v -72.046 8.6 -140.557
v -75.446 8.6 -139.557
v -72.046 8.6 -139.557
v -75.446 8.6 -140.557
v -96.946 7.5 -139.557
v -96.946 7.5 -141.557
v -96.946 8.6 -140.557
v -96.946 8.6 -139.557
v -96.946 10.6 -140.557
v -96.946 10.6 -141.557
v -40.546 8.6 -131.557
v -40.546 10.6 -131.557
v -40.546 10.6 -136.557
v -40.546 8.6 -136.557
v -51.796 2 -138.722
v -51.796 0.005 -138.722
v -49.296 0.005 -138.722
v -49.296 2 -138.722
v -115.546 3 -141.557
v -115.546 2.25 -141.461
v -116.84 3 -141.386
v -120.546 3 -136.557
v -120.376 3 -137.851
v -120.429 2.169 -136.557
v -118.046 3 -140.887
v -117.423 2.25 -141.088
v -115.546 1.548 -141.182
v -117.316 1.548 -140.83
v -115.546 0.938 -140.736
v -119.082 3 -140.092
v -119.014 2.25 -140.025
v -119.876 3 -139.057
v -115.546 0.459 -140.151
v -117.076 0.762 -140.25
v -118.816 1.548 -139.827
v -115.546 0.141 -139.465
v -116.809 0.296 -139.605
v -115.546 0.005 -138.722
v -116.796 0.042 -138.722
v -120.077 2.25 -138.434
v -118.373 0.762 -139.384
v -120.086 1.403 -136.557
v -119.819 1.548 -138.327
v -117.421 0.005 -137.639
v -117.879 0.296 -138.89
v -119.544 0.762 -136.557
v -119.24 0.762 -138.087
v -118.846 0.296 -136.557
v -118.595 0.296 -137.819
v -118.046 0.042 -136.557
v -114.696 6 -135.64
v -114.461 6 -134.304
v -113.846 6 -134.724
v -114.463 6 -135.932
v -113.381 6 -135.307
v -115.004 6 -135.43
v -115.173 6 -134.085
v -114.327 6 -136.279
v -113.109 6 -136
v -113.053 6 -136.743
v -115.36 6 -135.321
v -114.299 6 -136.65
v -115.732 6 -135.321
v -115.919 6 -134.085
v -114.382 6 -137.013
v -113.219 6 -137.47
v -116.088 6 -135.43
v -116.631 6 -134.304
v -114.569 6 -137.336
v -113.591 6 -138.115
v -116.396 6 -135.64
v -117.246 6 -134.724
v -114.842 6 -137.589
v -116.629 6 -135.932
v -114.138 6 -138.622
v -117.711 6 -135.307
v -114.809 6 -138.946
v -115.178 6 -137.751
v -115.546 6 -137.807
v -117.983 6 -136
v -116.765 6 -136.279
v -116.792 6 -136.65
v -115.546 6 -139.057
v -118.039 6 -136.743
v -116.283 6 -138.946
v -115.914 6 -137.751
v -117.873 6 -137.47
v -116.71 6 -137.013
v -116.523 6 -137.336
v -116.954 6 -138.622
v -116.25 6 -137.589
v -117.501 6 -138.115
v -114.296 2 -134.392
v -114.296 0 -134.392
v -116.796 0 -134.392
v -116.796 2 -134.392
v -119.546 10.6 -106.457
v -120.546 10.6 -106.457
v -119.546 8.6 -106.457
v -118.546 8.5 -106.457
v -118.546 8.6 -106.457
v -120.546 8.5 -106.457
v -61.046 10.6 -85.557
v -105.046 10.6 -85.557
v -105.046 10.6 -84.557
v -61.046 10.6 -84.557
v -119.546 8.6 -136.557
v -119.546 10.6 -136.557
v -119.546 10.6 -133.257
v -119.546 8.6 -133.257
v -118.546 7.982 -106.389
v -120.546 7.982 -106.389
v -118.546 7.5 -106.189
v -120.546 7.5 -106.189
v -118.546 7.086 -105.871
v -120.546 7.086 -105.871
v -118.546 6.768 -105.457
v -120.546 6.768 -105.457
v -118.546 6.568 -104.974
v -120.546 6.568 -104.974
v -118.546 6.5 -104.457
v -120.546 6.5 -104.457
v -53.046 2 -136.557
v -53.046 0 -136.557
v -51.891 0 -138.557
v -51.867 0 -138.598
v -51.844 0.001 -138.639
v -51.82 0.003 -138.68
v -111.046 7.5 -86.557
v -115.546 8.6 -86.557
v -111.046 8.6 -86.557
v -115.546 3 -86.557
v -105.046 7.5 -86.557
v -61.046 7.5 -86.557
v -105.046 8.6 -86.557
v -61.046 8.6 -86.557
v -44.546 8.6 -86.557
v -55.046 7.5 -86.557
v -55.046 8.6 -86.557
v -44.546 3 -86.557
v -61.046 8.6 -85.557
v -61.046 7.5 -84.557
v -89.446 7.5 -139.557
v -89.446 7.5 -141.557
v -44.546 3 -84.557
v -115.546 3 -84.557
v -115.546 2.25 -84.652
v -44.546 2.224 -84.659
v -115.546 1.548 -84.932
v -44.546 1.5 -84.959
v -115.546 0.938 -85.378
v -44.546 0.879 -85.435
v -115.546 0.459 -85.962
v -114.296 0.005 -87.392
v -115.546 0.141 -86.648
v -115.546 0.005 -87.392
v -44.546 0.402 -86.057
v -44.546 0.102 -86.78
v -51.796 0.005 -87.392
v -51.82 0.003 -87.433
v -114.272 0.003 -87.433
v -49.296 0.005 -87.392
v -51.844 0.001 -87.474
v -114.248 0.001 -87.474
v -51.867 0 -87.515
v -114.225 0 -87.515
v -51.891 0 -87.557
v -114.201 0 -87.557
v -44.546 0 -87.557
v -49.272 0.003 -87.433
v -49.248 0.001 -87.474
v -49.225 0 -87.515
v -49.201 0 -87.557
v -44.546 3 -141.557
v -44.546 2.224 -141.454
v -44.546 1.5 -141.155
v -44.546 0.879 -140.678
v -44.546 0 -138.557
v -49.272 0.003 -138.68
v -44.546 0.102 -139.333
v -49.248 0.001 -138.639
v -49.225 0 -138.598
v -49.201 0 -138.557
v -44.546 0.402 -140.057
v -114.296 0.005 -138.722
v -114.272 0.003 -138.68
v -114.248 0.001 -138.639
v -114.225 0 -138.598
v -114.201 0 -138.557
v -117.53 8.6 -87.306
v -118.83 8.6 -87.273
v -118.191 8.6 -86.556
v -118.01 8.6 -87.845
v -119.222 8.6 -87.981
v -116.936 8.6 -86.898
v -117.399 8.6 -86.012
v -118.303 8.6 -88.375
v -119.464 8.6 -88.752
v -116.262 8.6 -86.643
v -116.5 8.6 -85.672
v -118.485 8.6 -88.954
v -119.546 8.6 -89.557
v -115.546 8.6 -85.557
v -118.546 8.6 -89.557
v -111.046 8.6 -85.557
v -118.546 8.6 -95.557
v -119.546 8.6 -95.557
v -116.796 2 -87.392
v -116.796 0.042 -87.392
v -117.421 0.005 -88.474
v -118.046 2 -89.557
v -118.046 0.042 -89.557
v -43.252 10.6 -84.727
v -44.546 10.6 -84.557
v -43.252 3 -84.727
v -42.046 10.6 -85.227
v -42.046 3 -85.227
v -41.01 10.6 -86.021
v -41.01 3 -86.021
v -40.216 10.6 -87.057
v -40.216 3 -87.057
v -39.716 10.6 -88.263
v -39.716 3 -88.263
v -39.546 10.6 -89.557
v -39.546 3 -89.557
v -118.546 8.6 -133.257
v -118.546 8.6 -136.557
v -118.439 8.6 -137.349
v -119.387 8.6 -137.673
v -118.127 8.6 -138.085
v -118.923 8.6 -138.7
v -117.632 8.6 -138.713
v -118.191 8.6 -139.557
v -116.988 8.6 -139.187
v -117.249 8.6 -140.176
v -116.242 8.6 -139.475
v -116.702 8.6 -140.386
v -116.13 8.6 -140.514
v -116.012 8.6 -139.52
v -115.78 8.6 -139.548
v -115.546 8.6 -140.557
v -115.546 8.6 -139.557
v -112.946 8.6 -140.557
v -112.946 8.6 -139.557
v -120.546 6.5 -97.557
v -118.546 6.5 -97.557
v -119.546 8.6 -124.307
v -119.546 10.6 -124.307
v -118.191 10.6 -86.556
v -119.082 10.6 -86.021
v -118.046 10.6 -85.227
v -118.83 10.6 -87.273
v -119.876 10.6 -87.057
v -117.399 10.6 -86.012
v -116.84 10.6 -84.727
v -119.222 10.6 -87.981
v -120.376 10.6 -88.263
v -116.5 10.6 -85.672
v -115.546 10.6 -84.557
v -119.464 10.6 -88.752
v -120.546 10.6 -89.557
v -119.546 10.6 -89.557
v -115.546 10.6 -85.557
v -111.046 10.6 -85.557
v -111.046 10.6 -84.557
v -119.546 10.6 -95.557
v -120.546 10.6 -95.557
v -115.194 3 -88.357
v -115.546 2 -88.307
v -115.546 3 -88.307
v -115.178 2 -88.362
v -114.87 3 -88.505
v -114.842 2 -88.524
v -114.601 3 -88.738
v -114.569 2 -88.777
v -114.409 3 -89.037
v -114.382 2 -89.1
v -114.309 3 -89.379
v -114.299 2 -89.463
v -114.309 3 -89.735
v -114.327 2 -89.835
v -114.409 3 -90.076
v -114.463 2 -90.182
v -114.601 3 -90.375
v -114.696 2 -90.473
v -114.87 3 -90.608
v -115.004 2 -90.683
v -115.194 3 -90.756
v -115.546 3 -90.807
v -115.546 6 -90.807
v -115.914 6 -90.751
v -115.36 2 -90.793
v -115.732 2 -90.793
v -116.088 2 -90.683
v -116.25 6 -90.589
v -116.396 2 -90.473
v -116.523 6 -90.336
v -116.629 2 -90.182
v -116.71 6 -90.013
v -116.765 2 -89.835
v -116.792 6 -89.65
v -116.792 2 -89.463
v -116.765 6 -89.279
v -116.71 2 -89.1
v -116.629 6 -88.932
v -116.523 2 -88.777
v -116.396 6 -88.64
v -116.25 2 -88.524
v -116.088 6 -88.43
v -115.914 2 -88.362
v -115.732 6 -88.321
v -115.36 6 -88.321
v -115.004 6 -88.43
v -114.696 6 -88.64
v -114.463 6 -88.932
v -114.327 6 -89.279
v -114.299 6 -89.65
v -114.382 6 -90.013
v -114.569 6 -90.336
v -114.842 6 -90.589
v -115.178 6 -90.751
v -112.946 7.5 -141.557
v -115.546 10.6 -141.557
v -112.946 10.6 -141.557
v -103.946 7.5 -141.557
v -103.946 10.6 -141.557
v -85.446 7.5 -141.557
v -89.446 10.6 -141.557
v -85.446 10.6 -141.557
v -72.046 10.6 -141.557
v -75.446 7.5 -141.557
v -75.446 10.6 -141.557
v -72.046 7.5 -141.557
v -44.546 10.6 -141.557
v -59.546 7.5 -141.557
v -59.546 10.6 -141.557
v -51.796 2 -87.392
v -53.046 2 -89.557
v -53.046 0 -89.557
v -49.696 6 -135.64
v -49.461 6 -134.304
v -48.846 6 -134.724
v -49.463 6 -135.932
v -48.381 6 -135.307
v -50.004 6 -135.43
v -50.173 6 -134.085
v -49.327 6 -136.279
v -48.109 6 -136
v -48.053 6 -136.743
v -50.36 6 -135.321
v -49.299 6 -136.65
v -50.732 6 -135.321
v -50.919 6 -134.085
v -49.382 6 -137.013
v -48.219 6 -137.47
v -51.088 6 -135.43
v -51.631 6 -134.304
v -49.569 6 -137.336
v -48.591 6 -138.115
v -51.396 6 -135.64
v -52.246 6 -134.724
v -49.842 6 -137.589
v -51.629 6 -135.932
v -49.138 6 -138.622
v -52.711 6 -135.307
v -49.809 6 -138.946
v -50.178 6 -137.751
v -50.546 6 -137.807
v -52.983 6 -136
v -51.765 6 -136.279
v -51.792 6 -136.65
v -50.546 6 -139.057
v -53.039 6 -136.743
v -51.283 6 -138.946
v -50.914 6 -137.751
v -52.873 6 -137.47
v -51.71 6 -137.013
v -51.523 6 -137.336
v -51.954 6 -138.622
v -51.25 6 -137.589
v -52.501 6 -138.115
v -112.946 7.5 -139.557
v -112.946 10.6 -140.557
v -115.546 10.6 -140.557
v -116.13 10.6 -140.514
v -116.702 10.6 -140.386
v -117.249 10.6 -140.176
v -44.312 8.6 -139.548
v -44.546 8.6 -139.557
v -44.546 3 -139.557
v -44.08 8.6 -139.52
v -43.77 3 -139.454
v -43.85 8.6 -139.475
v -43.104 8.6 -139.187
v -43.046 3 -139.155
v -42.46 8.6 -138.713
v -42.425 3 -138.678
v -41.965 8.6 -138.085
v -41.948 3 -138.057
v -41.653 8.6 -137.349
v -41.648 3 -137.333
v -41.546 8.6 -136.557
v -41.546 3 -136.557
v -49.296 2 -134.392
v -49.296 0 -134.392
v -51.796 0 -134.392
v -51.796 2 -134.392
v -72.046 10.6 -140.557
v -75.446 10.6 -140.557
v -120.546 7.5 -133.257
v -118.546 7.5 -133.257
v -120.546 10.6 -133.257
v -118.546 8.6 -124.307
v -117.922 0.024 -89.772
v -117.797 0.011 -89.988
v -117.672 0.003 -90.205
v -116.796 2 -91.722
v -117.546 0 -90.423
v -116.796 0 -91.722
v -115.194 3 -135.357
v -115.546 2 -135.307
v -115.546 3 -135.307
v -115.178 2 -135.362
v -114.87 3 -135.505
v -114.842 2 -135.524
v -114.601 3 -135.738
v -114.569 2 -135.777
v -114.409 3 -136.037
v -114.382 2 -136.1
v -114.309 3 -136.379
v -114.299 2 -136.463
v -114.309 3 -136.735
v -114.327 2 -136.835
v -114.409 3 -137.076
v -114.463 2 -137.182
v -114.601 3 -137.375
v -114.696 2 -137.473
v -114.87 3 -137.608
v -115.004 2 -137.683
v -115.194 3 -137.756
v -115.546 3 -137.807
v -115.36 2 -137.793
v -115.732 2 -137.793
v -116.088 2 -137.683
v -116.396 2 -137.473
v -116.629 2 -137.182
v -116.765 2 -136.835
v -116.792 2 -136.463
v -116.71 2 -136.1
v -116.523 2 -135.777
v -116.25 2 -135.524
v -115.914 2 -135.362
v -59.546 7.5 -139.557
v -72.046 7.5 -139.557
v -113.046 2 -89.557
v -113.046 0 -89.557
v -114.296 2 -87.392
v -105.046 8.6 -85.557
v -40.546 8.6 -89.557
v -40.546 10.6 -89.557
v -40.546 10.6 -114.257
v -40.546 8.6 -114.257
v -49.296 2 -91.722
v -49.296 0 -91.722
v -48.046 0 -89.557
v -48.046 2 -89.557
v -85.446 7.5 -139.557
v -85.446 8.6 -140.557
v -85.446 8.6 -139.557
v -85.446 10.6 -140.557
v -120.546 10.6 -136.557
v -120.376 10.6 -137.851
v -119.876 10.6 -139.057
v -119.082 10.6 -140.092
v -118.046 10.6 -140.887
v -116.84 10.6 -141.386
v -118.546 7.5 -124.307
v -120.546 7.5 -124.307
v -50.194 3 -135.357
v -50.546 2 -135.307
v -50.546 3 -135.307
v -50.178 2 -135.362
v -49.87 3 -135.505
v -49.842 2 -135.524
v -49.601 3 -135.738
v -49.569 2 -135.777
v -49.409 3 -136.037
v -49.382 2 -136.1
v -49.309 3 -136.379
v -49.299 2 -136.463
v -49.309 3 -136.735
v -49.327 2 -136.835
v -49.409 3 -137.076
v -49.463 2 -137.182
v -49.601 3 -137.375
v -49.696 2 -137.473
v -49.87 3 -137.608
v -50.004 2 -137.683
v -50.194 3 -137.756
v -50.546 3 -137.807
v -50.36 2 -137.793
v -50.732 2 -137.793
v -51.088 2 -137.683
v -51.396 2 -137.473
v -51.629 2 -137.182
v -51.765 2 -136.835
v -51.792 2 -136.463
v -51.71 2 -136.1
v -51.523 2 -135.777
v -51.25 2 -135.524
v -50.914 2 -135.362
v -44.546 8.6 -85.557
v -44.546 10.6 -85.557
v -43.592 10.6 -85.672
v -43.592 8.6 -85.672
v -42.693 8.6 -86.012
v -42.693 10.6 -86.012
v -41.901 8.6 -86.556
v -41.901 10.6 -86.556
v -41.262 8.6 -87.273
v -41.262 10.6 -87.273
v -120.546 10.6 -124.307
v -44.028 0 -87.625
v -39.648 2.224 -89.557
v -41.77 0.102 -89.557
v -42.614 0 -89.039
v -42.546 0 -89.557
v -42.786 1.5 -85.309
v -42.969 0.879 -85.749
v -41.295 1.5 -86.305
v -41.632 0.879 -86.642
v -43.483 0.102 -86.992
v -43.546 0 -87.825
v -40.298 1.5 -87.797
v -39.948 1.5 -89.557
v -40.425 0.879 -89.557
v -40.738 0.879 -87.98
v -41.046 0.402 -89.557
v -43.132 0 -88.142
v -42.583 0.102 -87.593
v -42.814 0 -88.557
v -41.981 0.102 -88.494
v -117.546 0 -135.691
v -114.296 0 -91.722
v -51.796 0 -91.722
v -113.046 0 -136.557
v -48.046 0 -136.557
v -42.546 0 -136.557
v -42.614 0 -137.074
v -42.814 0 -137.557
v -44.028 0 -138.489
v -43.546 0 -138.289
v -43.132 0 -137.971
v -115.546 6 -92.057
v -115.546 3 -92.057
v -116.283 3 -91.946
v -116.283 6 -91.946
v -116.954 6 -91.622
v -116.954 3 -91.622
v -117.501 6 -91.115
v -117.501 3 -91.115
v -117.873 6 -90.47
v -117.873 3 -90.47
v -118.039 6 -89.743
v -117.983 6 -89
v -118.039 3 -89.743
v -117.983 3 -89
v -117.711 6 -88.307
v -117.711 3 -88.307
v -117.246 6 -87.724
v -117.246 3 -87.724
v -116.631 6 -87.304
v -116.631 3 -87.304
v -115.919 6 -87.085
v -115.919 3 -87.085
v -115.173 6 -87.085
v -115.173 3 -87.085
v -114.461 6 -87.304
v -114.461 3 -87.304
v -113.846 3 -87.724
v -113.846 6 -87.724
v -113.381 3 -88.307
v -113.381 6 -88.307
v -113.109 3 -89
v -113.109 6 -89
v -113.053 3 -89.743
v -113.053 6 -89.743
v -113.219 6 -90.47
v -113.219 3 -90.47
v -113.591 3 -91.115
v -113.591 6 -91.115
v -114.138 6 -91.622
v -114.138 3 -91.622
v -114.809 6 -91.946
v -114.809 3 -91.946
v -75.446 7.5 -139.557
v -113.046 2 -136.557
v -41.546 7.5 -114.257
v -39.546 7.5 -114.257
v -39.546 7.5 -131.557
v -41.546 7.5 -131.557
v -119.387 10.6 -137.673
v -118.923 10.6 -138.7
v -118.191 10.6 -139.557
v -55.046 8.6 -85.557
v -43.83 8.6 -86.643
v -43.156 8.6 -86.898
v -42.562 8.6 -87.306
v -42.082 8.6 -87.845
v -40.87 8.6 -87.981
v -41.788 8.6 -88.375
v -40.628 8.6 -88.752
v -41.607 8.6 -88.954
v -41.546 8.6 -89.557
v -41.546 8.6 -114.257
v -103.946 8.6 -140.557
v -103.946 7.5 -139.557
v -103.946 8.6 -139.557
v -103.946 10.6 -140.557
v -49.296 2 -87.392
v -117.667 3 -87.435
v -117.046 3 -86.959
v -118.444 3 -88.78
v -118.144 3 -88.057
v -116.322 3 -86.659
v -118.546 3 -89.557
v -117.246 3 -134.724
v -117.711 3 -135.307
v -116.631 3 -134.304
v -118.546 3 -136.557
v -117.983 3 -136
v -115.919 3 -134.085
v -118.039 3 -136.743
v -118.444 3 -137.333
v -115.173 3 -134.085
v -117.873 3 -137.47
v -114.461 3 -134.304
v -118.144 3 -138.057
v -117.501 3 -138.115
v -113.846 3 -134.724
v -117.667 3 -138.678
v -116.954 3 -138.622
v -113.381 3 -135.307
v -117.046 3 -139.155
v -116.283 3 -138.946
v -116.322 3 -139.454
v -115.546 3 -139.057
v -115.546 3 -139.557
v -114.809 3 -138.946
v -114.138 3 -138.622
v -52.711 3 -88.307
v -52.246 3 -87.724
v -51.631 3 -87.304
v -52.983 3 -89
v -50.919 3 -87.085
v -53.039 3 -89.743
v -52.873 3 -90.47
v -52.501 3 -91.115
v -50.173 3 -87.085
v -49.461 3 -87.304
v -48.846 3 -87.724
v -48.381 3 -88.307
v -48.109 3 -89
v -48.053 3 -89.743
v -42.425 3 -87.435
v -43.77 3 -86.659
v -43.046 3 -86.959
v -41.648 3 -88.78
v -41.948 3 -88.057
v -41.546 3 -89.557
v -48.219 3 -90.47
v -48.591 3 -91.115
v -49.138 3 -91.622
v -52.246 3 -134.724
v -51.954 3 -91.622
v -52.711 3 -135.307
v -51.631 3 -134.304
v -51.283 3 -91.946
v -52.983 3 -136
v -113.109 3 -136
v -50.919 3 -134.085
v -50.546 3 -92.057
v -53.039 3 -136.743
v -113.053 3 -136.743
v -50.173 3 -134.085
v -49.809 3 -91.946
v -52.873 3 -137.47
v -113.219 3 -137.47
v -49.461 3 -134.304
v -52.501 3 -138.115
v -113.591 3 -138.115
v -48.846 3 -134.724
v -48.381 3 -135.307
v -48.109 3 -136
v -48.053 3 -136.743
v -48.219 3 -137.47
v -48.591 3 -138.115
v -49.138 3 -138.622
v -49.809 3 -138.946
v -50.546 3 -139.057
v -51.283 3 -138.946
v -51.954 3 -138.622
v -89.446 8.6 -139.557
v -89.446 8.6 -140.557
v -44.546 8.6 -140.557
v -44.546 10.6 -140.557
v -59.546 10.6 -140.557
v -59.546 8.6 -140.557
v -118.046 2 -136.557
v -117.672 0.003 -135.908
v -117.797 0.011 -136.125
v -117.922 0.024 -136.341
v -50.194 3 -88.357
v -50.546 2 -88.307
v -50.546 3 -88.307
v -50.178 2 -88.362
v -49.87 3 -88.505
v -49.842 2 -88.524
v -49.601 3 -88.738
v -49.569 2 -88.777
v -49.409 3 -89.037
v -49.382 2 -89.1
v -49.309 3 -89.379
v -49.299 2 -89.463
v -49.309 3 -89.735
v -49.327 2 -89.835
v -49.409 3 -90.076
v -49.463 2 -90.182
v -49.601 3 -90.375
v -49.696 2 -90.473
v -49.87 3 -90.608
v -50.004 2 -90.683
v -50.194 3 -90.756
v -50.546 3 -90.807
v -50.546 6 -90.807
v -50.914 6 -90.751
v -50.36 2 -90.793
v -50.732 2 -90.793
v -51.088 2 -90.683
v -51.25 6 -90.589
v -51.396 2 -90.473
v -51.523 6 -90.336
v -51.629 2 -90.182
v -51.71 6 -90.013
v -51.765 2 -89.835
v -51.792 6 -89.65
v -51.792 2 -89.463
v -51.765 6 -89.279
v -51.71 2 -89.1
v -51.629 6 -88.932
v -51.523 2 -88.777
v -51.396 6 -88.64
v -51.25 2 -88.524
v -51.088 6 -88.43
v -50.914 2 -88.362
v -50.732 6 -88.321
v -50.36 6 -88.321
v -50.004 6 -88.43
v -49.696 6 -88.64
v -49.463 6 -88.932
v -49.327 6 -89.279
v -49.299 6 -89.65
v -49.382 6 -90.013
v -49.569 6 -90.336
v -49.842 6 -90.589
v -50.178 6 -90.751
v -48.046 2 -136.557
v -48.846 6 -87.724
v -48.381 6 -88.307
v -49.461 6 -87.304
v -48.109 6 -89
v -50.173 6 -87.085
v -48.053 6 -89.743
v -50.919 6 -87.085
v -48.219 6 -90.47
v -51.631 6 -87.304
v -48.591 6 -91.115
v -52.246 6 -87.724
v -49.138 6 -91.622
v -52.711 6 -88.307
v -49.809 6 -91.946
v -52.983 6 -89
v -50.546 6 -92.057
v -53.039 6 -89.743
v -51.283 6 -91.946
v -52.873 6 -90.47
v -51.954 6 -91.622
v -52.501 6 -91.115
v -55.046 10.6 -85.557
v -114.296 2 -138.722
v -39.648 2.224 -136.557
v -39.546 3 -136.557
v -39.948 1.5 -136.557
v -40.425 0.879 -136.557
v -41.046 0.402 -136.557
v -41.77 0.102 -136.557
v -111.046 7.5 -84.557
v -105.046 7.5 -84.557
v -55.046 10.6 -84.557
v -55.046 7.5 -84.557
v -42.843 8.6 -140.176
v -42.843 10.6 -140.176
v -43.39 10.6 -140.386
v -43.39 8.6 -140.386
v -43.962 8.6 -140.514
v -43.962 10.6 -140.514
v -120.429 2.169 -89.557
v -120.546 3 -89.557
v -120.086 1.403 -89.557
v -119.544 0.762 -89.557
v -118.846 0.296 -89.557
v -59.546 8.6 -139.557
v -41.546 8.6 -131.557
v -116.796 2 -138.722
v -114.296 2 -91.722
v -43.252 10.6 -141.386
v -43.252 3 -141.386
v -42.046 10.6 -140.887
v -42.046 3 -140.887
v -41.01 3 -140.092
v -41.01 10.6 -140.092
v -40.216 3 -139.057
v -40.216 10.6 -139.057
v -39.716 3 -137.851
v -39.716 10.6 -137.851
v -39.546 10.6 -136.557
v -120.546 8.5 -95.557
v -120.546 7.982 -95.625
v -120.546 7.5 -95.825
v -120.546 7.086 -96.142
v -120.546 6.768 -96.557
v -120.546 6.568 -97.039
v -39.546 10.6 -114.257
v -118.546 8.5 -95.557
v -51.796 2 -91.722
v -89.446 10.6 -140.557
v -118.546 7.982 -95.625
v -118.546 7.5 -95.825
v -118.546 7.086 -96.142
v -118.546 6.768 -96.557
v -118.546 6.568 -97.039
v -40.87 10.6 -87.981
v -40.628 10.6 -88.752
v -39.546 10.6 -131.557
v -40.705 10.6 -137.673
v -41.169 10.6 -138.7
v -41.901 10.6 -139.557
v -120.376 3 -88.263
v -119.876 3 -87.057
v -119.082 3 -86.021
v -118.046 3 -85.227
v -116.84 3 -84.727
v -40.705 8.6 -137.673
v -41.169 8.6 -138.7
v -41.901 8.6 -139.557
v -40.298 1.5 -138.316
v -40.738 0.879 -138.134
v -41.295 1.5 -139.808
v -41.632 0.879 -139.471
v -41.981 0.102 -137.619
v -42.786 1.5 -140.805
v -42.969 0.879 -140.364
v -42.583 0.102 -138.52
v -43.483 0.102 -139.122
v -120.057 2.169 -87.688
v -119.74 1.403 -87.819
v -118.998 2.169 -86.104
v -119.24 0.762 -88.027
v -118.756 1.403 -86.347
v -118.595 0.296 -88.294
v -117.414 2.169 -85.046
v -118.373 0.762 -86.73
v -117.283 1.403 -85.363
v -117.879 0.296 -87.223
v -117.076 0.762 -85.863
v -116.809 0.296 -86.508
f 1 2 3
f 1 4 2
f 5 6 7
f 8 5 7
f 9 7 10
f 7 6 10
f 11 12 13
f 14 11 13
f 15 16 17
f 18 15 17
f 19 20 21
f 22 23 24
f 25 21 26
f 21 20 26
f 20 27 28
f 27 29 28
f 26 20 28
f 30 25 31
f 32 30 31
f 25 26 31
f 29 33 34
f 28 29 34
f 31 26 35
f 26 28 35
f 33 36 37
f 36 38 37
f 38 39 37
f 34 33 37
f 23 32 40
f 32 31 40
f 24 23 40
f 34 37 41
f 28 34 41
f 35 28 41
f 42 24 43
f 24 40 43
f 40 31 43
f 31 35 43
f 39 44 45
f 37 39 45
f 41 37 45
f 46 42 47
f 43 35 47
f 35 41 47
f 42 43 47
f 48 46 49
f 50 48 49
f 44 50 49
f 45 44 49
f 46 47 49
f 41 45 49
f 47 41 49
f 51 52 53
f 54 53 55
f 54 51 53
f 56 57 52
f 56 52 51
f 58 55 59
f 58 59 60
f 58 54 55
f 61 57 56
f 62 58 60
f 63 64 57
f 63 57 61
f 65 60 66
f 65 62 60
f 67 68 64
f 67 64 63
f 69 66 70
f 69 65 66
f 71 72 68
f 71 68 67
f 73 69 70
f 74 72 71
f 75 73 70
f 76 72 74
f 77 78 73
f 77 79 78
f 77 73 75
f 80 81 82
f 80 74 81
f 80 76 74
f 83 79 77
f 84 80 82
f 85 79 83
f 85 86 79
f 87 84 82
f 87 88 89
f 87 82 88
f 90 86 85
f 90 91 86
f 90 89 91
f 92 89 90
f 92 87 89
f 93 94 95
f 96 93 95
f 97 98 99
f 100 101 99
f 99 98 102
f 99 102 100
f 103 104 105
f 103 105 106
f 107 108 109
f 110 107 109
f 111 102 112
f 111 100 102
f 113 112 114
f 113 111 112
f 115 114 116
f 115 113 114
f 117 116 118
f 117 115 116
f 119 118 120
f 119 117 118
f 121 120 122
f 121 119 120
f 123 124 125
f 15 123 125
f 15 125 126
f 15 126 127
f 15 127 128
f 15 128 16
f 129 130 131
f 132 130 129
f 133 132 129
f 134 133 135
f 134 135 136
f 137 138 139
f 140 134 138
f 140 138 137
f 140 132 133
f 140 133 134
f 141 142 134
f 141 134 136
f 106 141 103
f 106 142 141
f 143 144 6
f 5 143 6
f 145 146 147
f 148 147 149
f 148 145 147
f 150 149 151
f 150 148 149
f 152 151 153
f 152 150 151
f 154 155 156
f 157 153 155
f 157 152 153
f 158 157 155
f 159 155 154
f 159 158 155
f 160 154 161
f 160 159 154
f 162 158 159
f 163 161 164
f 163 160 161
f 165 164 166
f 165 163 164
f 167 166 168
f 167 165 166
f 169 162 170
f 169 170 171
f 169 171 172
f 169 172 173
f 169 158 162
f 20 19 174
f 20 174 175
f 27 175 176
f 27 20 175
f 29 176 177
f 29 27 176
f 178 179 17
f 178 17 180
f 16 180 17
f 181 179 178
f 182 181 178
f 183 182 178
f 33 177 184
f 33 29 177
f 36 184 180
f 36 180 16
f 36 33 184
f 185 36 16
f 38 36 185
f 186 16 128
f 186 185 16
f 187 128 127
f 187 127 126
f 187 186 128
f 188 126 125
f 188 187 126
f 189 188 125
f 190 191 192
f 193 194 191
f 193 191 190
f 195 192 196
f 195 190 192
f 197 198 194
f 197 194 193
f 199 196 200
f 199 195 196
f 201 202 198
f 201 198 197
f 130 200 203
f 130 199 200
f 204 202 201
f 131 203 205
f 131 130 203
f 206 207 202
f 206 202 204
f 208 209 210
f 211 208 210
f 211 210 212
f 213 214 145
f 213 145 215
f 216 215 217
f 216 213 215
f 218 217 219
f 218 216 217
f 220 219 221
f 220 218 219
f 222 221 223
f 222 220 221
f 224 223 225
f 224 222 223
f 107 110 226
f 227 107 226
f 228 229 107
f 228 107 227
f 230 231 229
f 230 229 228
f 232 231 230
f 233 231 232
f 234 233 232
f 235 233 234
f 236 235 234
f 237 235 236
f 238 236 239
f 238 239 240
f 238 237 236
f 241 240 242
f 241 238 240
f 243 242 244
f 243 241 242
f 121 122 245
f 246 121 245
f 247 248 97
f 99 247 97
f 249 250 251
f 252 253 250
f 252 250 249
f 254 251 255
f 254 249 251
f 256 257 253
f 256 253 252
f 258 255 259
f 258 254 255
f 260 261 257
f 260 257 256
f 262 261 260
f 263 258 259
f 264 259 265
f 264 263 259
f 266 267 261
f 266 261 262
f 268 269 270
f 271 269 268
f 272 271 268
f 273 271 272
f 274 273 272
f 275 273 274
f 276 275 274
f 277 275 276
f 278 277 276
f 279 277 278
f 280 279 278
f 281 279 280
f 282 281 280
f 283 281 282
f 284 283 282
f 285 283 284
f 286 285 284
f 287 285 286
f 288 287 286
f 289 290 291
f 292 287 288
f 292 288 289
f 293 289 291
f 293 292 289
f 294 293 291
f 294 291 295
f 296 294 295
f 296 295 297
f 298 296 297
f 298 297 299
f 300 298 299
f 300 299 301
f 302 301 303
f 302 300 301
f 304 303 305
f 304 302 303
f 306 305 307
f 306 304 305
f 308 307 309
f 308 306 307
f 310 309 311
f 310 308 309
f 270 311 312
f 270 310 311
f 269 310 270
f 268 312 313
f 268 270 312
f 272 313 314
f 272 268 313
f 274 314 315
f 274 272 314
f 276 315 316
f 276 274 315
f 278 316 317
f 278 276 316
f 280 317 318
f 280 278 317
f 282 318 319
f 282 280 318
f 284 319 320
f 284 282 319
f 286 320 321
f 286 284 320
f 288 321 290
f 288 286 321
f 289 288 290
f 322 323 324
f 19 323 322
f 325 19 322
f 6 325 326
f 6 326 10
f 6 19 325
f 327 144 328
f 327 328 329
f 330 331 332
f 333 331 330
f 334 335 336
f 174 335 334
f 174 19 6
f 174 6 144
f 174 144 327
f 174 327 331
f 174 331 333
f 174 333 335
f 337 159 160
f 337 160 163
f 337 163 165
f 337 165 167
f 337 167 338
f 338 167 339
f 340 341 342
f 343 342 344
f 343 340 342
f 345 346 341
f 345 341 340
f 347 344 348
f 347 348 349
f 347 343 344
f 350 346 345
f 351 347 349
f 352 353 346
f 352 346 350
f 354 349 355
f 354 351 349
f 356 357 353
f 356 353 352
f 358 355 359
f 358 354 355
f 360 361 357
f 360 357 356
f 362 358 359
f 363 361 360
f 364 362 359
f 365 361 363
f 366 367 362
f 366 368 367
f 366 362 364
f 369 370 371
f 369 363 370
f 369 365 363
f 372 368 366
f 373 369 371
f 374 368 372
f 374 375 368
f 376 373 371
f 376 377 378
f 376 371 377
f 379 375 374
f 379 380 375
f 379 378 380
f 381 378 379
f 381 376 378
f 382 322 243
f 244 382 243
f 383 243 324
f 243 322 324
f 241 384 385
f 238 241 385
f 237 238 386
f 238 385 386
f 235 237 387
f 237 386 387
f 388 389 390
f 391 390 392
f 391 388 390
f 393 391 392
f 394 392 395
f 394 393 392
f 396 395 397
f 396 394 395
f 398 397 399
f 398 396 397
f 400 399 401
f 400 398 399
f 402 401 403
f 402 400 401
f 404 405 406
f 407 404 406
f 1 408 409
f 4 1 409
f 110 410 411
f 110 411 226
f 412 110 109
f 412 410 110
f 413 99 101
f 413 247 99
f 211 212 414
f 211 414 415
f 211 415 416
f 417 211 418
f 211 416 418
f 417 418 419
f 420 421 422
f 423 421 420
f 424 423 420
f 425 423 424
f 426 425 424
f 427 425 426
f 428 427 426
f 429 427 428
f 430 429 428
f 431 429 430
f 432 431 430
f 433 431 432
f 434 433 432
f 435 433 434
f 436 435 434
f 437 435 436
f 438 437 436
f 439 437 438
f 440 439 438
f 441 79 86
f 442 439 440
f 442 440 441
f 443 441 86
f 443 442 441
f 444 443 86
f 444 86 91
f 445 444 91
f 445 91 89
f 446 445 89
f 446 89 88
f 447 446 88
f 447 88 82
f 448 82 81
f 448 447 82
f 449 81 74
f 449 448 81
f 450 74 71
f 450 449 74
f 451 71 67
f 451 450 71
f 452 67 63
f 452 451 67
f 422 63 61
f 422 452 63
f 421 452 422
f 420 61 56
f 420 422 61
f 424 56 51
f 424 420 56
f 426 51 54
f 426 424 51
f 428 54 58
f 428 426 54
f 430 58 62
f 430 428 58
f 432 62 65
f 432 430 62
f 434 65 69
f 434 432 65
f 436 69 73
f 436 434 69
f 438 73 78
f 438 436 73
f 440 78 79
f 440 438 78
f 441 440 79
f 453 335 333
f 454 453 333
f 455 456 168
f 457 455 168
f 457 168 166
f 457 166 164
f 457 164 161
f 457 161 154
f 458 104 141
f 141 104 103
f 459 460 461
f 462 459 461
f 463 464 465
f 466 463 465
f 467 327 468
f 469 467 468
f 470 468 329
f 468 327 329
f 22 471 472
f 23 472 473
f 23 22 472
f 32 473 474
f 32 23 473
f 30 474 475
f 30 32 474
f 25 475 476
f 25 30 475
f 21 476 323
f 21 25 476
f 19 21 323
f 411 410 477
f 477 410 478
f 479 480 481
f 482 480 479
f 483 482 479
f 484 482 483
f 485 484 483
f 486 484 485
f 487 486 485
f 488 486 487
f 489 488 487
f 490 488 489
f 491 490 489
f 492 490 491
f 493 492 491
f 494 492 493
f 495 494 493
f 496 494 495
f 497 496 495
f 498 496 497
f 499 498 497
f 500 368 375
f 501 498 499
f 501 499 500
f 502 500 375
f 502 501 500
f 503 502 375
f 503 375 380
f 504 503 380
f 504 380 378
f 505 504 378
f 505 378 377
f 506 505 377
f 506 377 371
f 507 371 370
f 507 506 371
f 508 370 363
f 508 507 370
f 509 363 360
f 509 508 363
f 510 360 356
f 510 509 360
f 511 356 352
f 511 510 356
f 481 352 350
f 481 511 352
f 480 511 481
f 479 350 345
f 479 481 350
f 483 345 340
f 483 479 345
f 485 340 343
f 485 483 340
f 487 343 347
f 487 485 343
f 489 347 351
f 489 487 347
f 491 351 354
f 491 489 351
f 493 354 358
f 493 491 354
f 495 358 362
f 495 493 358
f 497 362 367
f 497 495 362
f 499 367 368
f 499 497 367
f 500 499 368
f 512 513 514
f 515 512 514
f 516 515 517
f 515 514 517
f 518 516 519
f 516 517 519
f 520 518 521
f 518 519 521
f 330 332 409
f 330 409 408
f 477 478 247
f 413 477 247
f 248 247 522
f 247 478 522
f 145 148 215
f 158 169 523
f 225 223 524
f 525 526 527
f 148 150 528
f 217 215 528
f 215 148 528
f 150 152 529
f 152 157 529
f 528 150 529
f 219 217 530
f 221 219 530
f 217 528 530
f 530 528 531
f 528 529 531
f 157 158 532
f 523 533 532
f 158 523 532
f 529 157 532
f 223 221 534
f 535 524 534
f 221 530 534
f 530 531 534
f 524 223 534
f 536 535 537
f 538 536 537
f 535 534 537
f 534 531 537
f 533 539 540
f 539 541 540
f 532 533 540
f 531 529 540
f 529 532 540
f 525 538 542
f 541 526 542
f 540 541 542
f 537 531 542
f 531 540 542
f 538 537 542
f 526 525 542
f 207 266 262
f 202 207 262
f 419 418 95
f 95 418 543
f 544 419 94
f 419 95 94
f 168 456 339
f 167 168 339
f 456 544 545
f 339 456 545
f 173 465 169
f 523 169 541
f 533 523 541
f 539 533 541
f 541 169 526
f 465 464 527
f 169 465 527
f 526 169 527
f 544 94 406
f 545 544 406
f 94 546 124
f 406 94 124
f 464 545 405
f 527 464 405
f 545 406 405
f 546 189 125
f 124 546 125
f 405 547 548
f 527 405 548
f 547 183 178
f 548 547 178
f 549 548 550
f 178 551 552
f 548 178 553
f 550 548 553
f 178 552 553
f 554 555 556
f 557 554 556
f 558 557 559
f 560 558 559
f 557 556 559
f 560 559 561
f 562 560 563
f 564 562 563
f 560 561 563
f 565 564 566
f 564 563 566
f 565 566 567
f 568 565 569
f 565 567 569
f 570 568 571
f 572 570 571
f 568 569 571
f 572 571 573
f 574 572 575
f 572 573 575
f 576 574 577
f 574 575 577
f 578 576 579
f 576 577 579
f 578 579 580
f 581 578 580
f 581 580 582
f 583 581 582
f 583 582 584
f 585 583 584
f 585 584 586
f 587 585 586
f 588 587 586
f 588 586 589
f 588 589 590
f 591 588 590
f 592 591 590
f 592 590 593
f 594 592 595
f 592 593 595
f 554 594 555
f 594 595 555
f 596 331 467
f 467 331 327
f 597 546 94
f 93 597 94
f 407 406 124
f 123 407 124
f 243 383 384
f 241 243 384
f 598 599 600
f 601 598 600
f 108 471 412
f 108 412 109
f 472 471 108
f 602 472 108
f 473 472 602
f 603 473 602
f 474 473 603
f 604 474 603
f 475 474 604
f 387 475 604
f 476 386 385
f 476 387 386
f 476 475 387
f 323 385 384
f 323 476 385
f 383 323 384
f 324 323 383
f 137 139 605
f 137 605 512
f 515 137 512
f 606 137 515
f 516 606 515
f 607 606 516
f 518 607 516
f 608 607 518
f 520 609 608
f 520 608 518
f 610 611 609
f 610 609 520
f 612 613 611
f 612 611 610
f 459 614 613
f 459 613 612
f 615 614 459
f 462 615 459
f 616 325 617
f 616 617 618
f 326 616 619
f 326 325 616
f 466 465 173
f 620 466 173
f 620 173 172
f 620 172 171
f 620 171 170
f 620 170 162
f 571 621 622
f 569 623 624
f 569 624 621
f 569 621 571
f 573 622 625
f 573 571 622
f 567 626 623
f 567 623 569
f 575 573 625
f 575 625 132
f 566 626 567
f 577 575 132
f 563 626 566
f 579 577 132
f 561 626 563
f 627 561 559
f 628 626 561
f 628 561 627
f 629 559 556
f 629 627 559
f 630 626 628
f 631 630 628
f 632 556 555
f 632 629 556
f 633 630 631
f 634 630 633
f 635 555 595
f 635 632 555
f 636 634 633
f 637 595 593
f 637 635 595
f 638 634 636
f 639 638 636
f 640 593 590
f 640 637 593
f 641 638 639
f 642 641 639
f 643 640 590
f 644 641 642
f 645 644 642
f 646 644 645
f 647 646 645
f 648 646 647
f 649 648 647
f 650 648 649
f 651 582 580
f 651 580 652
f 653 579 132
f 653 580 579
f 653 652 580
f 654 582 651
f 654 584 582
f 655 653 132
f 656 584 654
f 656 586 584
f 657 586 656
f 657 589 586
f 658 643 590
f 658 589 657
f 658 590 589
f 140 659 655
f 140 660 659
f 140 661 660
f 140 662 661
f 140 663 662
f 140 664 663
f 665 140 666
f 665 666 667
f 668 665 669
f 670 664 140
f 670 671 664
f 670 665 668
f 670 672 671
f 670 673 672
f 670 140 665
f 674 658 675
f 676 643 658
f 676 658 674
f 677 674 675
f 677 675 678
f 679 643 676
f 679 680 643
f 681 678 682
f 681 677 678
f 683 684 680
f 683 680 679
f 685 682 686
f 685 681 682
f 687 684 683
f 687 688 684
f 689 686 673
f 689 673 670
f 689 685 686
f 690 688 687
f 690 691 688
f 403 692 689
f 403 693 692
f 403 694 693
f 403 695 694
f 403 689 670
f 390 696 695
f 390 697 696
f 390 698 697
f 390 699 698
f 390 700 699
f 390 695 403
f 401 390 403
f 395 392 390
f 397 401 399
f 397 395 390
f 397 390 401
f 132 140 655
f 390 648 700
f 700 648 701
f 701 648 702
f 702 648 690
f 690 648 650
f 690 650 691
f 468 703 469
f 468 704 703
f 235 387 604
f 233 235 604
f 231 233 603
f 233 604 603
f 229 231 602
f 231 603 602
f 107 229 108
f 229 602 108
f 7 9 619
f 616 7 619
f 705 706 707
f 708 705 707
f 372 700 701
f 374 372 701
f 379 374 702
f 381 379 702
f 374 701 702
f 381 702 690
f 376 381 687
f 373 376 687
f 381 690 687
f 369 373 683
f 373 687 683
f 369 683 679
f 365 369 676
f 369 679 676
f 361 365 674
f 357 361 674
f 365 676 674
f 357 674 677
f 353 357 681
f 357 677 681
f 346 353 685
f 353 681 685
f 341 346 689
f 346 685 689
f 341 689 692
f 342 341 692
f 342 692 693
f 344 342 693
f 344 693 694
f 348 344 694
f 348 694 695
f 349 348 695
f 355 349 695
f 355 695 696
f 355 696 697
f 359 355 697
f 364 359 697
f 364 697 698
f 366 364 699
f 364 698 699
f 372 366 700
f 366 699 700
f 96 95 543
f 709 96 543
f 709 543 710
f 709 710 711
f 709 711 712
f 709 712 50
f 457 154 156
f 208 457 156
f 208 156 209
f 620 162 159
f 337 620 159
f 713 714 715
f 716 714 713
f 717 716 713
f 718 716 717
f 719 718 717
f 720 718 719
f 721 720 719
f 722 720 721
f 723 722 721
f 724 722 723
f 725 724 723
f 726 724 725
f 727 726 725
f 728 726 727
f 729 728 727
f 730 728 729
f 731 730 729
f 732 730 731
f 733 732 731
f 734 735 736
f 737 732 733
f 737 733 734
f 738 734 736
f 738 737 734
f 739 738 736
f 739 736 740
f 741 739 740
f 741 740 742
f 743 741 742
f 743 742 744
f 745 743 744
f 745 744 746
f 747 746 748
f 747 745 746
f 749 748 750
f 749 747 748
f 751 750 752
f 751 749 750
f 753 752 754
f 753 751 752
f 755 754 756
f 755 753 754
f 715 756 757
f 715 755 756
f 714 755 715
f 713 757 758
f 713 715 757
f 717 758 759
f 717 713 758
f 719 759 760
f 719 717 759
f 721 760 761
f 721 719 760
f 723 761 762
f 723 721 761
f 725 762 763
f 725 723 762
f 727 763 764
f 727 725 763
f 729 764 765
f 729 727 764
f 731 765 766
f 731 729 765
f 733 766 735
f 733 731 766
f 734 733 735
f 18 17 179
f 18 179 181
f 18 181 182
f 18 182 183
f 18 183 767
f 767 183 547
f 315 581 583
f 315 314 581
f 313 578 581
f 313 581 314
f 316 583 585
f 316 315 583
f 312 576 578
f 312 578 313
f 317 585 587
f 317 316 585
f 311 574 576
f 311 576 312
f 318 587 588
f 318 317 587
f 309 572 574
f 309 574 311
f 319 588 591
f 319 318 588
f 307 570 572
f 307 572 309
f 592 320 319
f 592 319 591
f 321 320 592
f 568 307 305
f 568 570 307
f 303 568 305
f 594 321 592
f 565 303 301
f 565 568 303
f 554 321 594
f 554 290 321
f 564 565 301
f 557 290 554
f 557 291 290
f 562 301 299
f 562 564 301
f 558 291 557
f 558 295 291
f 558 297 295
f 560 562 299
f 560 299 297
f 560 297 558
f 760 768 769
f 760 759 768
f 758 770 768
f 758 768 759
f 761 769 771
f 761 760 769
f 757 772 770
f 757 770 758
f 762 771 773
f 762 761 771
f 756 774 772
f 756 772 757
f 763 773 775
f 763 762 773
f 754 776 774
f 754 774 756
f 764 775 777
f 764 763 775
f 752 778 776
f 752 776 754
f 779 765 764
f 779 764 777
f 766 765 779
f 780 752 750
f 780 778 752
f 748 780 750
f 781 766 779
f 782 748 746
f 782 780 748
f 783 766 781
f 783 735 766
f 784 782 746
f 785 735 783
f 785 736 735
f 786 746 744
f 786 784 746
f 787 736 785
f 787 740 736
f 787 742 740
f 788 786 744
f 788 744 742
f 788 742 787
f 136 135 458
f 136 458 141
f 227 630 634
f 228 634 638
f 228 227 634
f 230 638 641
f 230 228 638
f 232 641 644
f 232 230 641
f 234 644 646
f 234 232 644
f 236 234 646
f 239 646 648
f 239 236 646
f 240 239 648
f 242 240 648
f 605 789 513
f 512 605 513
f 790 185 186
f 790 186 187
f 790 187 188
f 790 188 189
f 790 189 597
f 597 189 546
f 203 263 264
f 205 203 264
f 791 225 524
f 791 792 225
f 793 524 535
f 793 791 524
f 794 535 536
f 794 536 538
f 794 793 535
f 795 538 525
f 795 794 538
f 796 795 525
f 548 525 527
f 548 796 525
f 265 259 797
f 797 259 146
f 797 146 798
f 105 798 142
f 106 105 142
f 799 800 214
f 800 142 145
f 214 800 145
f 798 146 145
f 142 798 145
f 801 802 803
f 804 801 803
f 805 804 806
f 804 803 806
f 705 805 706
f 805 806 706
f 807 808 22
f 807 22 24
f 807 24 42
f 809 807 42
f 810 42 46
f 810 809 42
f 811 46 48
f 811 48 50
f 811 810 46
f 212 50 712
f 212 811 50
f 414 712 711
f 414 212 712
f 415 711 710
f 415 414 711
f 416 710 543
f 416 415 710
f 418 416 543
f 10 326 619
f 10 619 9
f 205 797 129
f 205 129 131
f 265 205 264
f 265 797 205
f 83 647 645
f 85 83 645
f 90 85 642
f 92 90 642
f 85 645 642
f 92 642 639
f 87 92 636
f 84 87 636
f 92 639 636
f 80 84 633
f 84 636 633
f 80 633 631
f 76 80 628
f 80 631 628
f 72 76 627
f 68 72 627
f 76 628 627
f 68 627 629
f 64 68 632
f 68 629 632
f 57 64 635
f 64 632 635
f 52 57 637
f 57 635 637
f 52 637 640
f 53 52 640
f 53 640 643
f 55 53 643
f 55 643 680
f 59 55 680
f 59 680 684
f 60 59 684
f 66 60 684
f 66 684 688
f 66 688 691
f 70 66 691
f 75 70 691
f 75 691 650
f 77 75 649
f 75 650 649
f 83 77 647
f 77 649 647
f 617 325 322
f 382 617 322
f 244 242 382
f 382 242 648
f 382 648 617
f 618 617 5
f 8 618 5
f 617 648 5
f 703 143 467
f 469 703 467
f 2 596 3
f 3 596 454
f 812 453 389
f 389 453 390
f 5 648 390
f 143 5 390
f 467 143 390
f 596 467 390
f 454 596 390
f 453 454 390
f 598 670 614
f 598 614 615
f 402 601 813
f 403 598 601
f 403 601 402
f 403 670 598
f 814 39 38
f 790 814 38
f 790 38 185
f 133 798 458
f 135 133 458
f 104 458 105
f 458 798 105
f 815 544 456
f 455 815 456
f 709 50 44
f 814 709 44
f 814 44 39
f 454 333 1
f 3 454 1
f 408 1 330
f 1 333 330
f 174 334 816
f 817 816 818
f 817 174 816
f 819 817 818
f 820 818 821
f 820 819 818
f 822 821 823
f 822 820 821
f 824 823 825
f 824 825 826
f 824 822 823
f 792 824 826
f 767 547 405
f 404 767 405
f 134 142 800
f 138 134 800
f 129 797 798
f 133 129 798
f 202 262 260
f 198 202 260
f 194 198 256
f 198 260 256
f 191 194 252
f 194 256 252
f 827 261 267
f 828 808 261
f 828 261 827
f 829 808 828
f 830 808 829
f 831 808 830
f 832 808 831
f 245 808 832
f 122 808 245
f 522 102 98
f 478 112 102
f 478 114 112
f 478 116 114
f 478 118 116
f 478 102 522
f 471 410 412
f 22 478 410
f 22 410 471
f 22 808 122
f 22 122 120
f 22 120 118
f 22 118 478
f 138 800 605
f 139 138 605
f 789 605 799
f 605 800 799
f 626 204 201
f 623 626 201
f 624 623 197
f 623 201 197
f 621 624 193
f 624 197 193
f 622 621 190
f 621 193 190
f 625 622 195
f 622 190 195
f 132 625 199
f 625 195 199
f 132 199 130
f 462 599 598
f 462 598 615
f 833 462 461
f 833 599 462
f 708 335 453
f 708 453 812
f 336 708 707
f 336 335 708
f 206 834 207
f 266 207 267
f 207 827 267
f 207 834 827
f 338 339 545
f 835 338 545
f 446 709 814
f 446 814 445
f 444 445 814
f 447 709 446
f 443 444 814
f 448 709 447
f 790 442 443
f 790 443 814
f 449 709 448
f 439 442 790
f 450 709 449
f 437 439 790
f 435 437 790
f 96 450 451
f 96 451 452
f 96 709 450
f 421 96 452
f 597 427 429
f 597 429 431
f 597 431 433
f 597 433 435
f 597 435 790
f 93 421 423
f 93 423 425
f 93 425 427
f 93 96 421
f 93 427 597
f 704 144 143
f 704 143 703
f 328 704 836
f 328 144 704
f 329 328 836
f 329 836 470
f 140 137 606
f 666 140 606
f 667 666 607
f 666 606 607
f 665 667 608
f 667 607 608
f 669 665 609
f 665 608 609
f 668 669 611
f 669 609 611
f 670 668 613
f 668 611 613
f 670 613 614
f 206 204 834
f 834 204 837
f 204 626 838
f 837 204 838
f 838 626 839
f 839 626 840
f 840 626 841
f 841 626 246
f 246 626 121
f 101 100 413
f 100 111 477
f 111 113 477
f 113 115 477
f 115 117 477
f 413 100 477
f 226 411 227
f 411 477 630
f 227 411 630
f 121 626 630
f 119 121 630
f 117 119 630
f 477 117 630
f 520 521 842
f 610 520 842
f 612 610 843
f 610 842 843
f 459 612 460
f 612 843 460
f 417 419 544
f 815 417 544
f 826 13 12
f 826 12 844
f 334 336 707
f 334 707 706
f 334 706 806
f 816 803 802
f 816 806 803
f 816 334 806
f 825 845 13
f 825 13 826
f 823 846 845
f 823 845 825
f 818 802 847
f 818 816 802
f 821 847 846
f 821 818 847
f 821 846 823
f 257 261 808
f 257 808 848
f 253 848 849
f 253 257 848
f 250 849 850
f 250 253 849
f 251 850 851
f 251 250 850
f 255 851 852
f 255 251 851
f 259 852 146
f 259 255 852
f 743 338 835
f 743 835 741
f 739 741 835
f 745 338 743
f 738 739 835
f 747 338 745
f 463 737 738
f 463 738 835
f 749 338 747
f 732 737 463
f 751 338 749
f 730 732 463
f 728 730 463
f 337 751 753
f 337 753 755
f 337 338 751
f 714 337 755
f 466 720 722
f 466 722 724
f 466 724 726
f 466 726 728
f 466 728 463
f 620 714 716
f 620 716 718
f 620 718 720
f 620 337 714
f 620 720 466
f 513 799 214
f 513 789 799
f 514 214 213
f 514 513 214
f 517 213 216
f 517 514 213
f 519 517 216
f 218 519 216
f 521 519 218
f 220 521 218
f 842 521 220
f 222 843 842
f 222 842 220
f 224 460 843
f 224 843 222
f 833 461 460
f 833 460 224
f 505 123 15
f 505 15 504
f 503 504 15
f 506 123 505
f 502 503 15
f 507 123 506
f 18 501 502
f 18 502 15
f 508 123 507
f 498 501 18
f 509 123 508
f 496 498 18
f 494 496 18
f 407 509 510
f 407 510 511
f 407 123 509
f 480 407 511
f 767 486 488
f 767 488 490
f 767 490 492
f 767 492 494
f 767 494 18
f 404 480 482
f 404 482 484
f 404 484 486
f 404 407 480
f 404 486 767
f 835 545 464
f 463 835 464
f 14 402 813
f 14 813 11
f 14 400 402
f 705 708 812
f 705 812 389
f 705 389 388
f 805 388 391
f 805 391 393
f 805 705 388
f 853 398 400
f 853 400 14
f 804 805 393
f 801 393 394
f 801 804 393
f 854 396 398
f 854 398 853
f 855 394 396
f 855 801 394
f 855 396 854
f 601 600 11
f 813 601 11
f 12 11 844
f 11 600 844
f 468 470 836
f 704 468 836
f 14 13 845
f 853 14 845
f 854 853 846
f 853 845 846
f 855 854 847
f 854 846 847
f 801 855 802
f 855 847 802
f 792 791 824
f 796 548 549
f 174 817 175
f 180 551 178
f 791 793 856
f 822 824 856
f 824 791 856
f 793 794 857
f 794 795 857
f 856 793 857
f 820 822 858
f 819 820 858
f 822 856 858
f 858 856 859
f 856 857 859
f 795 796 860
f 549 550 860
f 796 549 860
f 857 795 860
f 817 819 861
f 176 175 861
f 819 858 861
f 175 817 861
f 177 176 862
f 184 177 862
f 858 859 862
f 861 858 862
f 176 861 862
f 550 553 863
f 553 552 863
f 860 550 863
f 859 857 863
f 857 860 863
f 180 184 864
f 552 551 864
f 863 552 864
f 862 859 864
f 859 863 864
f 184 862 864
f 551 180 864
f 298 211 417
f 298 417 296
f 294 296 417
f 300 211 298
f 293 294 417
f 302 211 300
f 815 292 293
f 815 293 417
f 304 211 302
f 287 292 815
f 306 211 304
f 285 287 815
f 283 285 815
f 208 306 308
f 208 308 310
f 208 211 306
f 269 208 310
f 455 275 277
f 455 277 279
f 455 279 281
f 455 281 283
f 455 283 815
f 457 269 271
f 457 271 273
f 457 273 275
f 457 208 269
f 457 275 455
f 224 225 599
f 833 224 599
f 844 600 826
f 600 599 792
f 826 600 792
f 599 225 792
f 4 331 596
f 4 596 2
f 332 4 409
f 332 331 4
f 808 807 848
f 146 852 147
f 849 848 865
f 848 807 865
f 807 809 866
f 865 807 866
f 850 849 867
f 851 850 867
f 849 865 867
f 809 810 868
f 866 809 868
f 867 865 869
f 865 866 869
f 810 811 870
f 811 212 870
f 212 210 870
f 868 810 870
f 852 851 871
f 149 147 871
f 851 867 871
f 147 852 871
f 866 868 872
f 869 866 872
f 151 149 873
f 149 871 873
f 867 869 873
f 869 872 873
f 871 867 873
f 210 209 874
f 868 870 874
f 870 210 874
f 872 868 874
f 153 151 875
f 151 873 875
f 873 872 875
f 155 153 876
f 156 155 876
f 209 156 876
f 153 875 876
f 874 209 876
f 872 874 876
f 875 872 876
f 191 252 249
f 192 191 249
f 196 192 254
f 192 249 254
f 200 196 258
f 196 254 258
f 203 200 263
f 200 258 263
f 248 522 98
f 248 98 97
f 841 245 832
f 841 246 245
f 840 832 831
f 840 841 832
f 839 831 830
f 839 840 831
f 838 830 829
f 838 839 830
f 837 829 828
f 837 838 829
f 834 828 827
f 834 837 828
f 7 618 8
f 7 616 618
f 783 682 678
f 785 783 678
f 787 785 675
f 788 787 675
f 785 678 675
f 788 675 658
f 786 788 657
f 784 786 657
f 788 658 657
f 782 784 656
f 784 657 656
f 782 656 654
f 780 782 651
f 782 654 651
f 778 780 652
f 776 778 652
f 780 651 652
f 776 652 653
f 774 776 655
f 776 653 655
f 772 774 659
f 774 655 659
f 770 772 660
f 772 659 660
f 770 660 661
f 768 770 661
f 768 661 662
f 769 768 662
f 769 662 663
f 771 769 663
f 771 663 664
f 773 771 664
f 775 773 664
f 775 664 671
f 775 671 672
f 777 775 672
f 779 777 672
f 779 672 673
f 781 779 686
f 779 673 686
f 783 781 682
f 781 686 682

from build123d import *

# Parameters (mm, degrees)
SKETCH_4_W          = 81
SKETCH_4_H          = 57
SKETCH_4_R          = 1.25
EXTRUDE_5_DEPTH     = 3
EXTRUDE_START       = 3
SKETCH_4_4_R        = 2.5
SKETCH_4_4_R_2      = 1.25
EXTRUDE_6_DEPTH     = 3
SKETCH_4_5_W        = 81
SKETCH_4_5_H        = 57
SKETCH_4_5_W_2      = 77
SKETCH_4_5_H_2      = 53
EXTRUDE_7_DEPTH     = 10.6
SKETCH_6_W          = 12.5
SKETCH_6_H          = 3.1
SKETCH_6_W_2        = 10
SKETCH_6_W_3        = 7.5
SKETCH_6_W_4        = 9
CUT_EXTRUDE_1_DEPTH = 2
SKETCH_7_W          = 8.95
SKETCH_7_H          = 3.1
SKETCH_7_W_2        = 8.9
CUT_EXTRUDE_2_DEPTH = 2
FILLET_1_R          = 2
SKETCH_8_W          = 6
SKETCH_8_H          = 3.1
CUT_EXTRUDE_3_DEPTH = 2
SKETCH_9_W          = 17.3
SKETCH_9_H          = 3.1
CUT_EXTRUDE_4_DEPTH = 2
FILLET_2_R          = 3
FILLET_3_R          = 5
FILLET_4_R          = 3
CUT_EXTRUDE_5_DEPTH = 2
SKETCH_11_W         = 44
SKETCH_11_H         = 1
CUT_EXTRUDE_6_DEPTH = 2


with BuildPart() as part:
    # 草图4 → 凸台-拉伸5 (new body)
    with BuildSketch(Plane(origin=(0, 0, 0), x_dir=(1, 0, 0), z_dir=(0, 1, 0))):
        with Locations((-80.045972017, 113.056664423)):
            Rectangle(SKETCH_4_W, SKETCH_4_H)
        with Locations(Location((-115.545972017, 136.556664423, 0), (0, 0, 270))):
            Circle(SKETCH_4_R, mode=Mode.SUBTRACT)
        with Locations(Location((-50.545972017, 136.556664423, 0), (0, 0, 270))):
            Circle(SKETCH_4_R, mode=Mode.SUBTRACT)
        with Locations(Location((-50.545972017, 89.556664423, 0), (0, 0, 270))):
            Circle(SKETCH_4_R, mode=Mode.SUBTRACT)
        with Locations(Location((-115.545972017, 89.556664423, 0), (0, 0, 270))):
            Circle(SKETCH_4_R, mode=Mode.SUBTRACT)
    extrude(amount=EXTRUDE_5_DEPTH)

    # 草图4<4> → 凸台-拉伸6 (add)
    # profile 1 of 4: a face of its own
    with BuildSketch(Plane(origin=(0, 0, 0), x_dir=(1, 0, 0), z_dir=(0, 1, 0)).offset(EXTRUDE_START)):
        with Locations(Location((-50.545972017, 89.556664423, 0), (0, 0, 90))):
            Circle(SKETCH_4_4_R)
        with Locations(Location((-50.545972017, 89.556664423, 0), (0, 0, 90))):
            Circle(SKETCH_4_4_R_2, mode=Mode.SUBTRACT)
    # profile 2 of 4: a face of its own
    with BuildSketch(Plane(origin=(0, 0, 0), x_dir=(1, 0, 0), z_dir=(0, 1, 0)).offset(EXTRUDE_START)):
        with Locations(Location((-115.545972017, 89.556664423, 0), (0, 0, 90))):
            Circle(SKETCH_4_4_R)
        with Locations(Location((-115.545972017, 89.556664423, 0), (0, 0, 90))):
            Circle(SKETCH_4_4_R_2, mode=Mode.SUBTRACT)
    # profile 3 of 4: a face of its own
    with BuildSketch(Plane(origin=(0, 0, 0), x_dir=(1, 0, 0), z_dir=(0, 1, 0)).offset(EXTRUDE_START)):
        with Locations(Location((-50.545972017, 136.556664423, 0), (0, 0, 90))):
            Circle(SKETCH_4_4_R)
        with Locations(Location((-50.545972017, 136.556664423, 0), (0, 0, 90))):
            Circle(SKETCH_4_4_R_2, mode=Mode.SUBTRACT)
    # profile 4 of 4: a face of its own
    with BuildSketch(Plane(origin=(0, 0, 0), x_dir=(1, 0, 0), z_dir=(0, 1, 0)).offset(EXTRUDE_START)):
        with Locations(Location((-115.545972017, 136.556664423, 0), (0, 0, 90))):
            Circle(SKETCH_4_4_R)
        with Locations(Location((-115.545972017, 136.556664423, 0), (0, 0, 90))):
            Circle(SKETCH_4_4_R_2, mode=Mode.SUBTRACT)
    extrude(amount=EXTRUDE_6_DEPTH)

    # 草图4<5> → 凸台-拉伸7 (add)
    with BuildSketch(Plane(origin=(0, 0, 0), x_dir=(1, 0, 0), z_dir=(0, 1, 0))):
        with Locations((-80.045972017, 113.056664423)):
            Rectangle(SKETCH_4_5_W, SKETCH_4_5_H)
        with Locations((-80.045972017, 113.056664423)):
            Rectangle(SKETCH_4_5_W_2, SKETCH_4_5_H_2, mode=Mode.SUBTRACT)
    extrude(amount=EXTRUDE_7_DEPTH)

    # 草图6 → 切除-拉伸1 (cut)
    with BuildSketch(Plane(origin=(0, 0, -141.556664423), x_dir=(-1, 0, 0), z_dir=(0, 0, -1))):
        with Locations((65.795972017, 9.05)):
            Rectangle(SKETCH_6_W, SKETCH_6_H)
        with Locations((80.445972017, 9.05)):
            Rectangle(SKETCH_6_W_2, SKETCH_6_H)
        with Locations((93.195972017, 9.05)):
            Rectangle(SKETCH_6_W_3, SKETCH_6_H)
        with Locations((108.445972017, 9.05)):
            Rectangle(SKETCH_6_W_4, SKETCH_6_H)
    extrude(amount=-CUT_EXTRUDE_1_DEPTH, mode=Mode.SUBTRACT)

    # 草图7 → 切除-拉伸2 (cut)
    with BuildSketch(Plane.ZY.offset(120.545972017)):
        with Locations((-128.781664423, 9.05)):
            Rectangle(SKETCH_7_W, SKETCH_7_H)
        with Locations((-101.006664423, 9.05)):
            Rectangle(SKETCH_7_W_2, SKETCH_7_H)
        Polygon((-105.456664423, 10.6), (-106.456664423, 10.6), (-106.456664423, 6.5), (-95.556664423, 6.5), (-95.556664423, 10.6), (-96.556664423, 10.6), (-96.556664423, 7.5), (-105.456664423, 7.5), align=None)
    extrude(amount=-CUT_EXTRUDE_2_DEPTH, mode=Mode.SUBTRACT)

    # 圆角1
    fillet_1_edges = [part.edges().sort_by_distance(p)[0] for p in [
        (-119.545972017, 6.5, -95.556664423),
        (-119.545972017, 6.5, -106.456664423),
    ]]
    fillet(fillet_1_edges, radius=FILLET_1_R)

    # 草图8 → 切除-拉伸3 (cut)
    with BuildSketch(Plane.XY.offset(-84.556664423)):
        with Locations((-108.045972017, 9.05)):
            Rectangle(SKETCH_8_W, SKETCH_8_H)
        with Locations((-58.045972017, 9.05)):
            Rectangle(SKETCH_8_W, SKETCH_8_H)
    extrude(amount=-CUT_EXTRUDE_3_DEPTH, mode=Mode.SUBTRACT)

    # 草图9 → 切除-拉伸4 (cut)
    with BuildSketch(Plane(origin=(-39.545972017, 0, 0), x_dir=(0, 0, -1), z_dir=(1, 0, 0))):
        with Locations((122.906664423, 9.05)):
            Rectangle(SKETCH_9_W, SKETCH_9_H)
    extrude(amount=-CUT_EXTRUDE_4_DEPTH, mode=Mode.SUBTRACT)

    # 圆角2
    fillet_2_edges = [part.edges().sort_by_distance(p)[0] for p in [
        (-118.545972017, 6.8, -139.556664423),
        (-41.545972017, 6.8, -139.556664423),
        (-41.545972017, 6.8, -86.556664423),
        (-118.545972017, 6.8, -86.556664423),
    ]]
    fillet(fillet_2_edges, radius=FILLET_2_R)

    # 圆角3
    fillet_3_edges = [part.edges().sort_by_distance(p)[0] for p in [
        (-120.545972017, 5.3, -141.556664423),
        (-120.545972017, 5.3, -84.556664423),
        (-39.545972017, 5.3, -84.556664423),
        (-39.545972017, 5.3, -141.556664423),
    ]]
    fillet(fillet_3_edges, radius=FILLET_3_R)

    # 圆角4
    fillet_4_edges = [part.edges().sort_by_distance(p)[0] for p in [
        (-80.045972017, 0, -84.556664423),
        (-80.045972017, 0, -141.556664423),
        (-39.545972017, 0, -113.056664423),
        (-120.545972017, 0, -113.056664423),
        (-119.081505923, 0, -140.092198329),
        (-41.010438111, 0, -140.092198329),
        (-41.010438111, 0, -86.021130517),
        (-119.081505923, 0, -86.021130517),
    ]]
    fillet(fillet_4_edges, radius=FILLET_4_R)

    # 草图10 → 切除-拉伸5 (cut)
    with BuildSketch(Plane.XZ):
        Polygon((-48.045972017, -89.556664423), (-49.295972017, -87.391600913), (-51.795972017, -87.391600913), (-53.045972017, -89.556664423), (-51.795972017, -91.721727932), (-49.295972017, -91.721727932), align=None)
        Polygon((-113.045972017, -89.556664423), (-114.295972017, -87.391600913), (-116.795972017, -87.391600913), (-118.045972017, -89.556664423), (-116.795972017, -91.721727932), (-114.295972017, -91.721727932), align=None)
        Polygon((-113.045972017, -136.556664423), (-114.295972017, -134.391600913), (-116.795972017, -134.391600913), (-118.045972017, -136.556664423), (-116.795972017, -138.721727932), (-114.295972017, -138.721727932), align=None)
        Polygon((-48.045972017, -136.556664423), (-49.295972017, -134.391600913), (-51.795972017, -134.391600913), (-53.045972017, -136.556664423), (-51.795972017, -138.721727932), (-49.295972017, -138.721727932), align=None)
    extrude(amount=-CUT_EXTRUDE_5_DEPTH, mode=Mode.SUBTRACT)

    # 草图11 → 切除-拉伸6 (cut)
    with BuildSketch(Plane(origin=(0, 10.6, 0), x_dir=(1, 0, 0), z_dir=(0, 1, 0))):
        with BuildLine():
            Line((-41.261655488, 87.273406895), (-42.082349142, 87.844775895))
            ThreePointArc((-42.082349142, 87.844775895), (-43.155947841, 86.898124825), (-44.545972017, 86.556664423))
            Line((-44.545972017, 86.556664423), (-61.045972017, 86.556664423))
            Line((-61.045972017, 86.556664423), (-61.045972017, 85.556664423))
            Line((-61.045972017, 85.556664423), (-44.545972017, 85.556664423))
            ThreePointArc((-44.545972017, 85.556664423), (-42.693005491, 86.011736348), (-41.261655488, 87.273406895))
        make_face()
        with BuildLine():
            ThreePointArc((-40.545972017, 136.556664423), (-41.168680103, 138.700002783), (-42.842921681, 140.17600408))
            Line((-42.842921681, 140.17600408), (-43.850059004, 139.474832526))
            ThreePointArc((-43.850059004, 139.474832526), (-42.1914297, 138.415731522), (-41.545972017, 136.556664423))
            Line((-41.545972017, 136.556664423), (-41.545972017, 89.556664423))
            ThreePointArc((-41.545972017, 89.556664423), (-41.683205119, 88.659688566), (-42.082349142, 87.844775895))
            Line((-42.082349142, 87.844775895), (-41.261655488, 87.273406895))
            ThreePointArc((-41.261655488, 87.273406895), (-40.729084141, 88.360266938), (-40.545972017, 89.556664423))
            Line((-40.545972017, 89.556664423), (-40.545972017, 136.556664423))
        make_face()
        with BuildLine():
            Line((-44.545972017, 140.556664423), (-115.545972017, 140.556664423))
            ThreePointArc((-115.545972017, 140.556664423), (-116.418508942, 140.460339526), (-117.249022353, 140.17600408))
            Line((-117.249022353, 140.17600408), (-116.24188503, 139.474832526))
            ThreePointArc((-116.24188503, 139.474832526), (-115.896325903, 139.536136214), (-115.545972017, 139.556664423))
            Line((-115.545972017, 139.556664423), (-44.545972017, 139.556664423))
            ThreePointArc((-44.545972017, 139.556664423), (-44.195618131, 139.536136214), (-43.850059004, 139.474832526))
            Line((-43.850059004, 139.474832526), (-42.842921681, 140.17600408))
            ThreePointArc((-42.842921681, 140.17600408), (-43.673435092, 140.460339526), (-44.545972017, 140.556664423))
        make_face()
        with BuildLine():
            Line((-116.24188503, 139.474832526), (-117.249022353, 140.17600408))
            ThreePointArc((-117.249022353, 140.17600408), (-118.923263931, 138.700002783), (-119.545972017, 136.556664423))
            Line((-119.545972017, 136.556664423), (-119.545972017, 89.556664423))
            ThreePointArc((-119.545972017, 89.556664423), (-119.362859893, 88.360266938), (-118.830288546, 87.273406895))
            Line((-118.830288546, 87.273406895), (-118.009594892, 87.844775895))
            ThreePointArc((-118.009594892, 87.844775895), (-118.408738915, 88.659688566), (-118.545972017, 89.556664423))
            Line((-118.545972017, 89.556664423), (-118.545972017, 136.556664423))
            ThreePointArc((-118.545972017, 136.556664423), (-117.900514333, 138.415731522), (-116.24188503, 139.474832526))
        make_face()
        with BuildLine():
            ThreePointArc((-115.545972017, 86.556664423), (-116.935996192, 86.898124825), (-118.009594892, 87.844775895))
            Line((-118.009594892, 87.844775895), (-118.830288546, 87.273406895))
            ThreePointArc((-118.830288546, 87.273406895), (-117.398938542, 86.011736348), (-115.545972017, 85.556664423))
            Line((-115.545972017, 85.556664423), (-105.045972017, 85.556664423))
            Line((-105.045972017, 85.556664423), (-105.045972017, 86.556664423))
            Line((-105.045972017, 86.556664423), (-115.545972017, 86.556664423))
        make_face()
        with Locations((-83.045972017, 86.056664423)):
            Rectangle(SKETCH_11_W, SKETCH_11_H)
    extrude(amount=-CUT_EXTRUDE_6_DEPTH, mode=Mode.SUBTRACT)


solid = part.part
